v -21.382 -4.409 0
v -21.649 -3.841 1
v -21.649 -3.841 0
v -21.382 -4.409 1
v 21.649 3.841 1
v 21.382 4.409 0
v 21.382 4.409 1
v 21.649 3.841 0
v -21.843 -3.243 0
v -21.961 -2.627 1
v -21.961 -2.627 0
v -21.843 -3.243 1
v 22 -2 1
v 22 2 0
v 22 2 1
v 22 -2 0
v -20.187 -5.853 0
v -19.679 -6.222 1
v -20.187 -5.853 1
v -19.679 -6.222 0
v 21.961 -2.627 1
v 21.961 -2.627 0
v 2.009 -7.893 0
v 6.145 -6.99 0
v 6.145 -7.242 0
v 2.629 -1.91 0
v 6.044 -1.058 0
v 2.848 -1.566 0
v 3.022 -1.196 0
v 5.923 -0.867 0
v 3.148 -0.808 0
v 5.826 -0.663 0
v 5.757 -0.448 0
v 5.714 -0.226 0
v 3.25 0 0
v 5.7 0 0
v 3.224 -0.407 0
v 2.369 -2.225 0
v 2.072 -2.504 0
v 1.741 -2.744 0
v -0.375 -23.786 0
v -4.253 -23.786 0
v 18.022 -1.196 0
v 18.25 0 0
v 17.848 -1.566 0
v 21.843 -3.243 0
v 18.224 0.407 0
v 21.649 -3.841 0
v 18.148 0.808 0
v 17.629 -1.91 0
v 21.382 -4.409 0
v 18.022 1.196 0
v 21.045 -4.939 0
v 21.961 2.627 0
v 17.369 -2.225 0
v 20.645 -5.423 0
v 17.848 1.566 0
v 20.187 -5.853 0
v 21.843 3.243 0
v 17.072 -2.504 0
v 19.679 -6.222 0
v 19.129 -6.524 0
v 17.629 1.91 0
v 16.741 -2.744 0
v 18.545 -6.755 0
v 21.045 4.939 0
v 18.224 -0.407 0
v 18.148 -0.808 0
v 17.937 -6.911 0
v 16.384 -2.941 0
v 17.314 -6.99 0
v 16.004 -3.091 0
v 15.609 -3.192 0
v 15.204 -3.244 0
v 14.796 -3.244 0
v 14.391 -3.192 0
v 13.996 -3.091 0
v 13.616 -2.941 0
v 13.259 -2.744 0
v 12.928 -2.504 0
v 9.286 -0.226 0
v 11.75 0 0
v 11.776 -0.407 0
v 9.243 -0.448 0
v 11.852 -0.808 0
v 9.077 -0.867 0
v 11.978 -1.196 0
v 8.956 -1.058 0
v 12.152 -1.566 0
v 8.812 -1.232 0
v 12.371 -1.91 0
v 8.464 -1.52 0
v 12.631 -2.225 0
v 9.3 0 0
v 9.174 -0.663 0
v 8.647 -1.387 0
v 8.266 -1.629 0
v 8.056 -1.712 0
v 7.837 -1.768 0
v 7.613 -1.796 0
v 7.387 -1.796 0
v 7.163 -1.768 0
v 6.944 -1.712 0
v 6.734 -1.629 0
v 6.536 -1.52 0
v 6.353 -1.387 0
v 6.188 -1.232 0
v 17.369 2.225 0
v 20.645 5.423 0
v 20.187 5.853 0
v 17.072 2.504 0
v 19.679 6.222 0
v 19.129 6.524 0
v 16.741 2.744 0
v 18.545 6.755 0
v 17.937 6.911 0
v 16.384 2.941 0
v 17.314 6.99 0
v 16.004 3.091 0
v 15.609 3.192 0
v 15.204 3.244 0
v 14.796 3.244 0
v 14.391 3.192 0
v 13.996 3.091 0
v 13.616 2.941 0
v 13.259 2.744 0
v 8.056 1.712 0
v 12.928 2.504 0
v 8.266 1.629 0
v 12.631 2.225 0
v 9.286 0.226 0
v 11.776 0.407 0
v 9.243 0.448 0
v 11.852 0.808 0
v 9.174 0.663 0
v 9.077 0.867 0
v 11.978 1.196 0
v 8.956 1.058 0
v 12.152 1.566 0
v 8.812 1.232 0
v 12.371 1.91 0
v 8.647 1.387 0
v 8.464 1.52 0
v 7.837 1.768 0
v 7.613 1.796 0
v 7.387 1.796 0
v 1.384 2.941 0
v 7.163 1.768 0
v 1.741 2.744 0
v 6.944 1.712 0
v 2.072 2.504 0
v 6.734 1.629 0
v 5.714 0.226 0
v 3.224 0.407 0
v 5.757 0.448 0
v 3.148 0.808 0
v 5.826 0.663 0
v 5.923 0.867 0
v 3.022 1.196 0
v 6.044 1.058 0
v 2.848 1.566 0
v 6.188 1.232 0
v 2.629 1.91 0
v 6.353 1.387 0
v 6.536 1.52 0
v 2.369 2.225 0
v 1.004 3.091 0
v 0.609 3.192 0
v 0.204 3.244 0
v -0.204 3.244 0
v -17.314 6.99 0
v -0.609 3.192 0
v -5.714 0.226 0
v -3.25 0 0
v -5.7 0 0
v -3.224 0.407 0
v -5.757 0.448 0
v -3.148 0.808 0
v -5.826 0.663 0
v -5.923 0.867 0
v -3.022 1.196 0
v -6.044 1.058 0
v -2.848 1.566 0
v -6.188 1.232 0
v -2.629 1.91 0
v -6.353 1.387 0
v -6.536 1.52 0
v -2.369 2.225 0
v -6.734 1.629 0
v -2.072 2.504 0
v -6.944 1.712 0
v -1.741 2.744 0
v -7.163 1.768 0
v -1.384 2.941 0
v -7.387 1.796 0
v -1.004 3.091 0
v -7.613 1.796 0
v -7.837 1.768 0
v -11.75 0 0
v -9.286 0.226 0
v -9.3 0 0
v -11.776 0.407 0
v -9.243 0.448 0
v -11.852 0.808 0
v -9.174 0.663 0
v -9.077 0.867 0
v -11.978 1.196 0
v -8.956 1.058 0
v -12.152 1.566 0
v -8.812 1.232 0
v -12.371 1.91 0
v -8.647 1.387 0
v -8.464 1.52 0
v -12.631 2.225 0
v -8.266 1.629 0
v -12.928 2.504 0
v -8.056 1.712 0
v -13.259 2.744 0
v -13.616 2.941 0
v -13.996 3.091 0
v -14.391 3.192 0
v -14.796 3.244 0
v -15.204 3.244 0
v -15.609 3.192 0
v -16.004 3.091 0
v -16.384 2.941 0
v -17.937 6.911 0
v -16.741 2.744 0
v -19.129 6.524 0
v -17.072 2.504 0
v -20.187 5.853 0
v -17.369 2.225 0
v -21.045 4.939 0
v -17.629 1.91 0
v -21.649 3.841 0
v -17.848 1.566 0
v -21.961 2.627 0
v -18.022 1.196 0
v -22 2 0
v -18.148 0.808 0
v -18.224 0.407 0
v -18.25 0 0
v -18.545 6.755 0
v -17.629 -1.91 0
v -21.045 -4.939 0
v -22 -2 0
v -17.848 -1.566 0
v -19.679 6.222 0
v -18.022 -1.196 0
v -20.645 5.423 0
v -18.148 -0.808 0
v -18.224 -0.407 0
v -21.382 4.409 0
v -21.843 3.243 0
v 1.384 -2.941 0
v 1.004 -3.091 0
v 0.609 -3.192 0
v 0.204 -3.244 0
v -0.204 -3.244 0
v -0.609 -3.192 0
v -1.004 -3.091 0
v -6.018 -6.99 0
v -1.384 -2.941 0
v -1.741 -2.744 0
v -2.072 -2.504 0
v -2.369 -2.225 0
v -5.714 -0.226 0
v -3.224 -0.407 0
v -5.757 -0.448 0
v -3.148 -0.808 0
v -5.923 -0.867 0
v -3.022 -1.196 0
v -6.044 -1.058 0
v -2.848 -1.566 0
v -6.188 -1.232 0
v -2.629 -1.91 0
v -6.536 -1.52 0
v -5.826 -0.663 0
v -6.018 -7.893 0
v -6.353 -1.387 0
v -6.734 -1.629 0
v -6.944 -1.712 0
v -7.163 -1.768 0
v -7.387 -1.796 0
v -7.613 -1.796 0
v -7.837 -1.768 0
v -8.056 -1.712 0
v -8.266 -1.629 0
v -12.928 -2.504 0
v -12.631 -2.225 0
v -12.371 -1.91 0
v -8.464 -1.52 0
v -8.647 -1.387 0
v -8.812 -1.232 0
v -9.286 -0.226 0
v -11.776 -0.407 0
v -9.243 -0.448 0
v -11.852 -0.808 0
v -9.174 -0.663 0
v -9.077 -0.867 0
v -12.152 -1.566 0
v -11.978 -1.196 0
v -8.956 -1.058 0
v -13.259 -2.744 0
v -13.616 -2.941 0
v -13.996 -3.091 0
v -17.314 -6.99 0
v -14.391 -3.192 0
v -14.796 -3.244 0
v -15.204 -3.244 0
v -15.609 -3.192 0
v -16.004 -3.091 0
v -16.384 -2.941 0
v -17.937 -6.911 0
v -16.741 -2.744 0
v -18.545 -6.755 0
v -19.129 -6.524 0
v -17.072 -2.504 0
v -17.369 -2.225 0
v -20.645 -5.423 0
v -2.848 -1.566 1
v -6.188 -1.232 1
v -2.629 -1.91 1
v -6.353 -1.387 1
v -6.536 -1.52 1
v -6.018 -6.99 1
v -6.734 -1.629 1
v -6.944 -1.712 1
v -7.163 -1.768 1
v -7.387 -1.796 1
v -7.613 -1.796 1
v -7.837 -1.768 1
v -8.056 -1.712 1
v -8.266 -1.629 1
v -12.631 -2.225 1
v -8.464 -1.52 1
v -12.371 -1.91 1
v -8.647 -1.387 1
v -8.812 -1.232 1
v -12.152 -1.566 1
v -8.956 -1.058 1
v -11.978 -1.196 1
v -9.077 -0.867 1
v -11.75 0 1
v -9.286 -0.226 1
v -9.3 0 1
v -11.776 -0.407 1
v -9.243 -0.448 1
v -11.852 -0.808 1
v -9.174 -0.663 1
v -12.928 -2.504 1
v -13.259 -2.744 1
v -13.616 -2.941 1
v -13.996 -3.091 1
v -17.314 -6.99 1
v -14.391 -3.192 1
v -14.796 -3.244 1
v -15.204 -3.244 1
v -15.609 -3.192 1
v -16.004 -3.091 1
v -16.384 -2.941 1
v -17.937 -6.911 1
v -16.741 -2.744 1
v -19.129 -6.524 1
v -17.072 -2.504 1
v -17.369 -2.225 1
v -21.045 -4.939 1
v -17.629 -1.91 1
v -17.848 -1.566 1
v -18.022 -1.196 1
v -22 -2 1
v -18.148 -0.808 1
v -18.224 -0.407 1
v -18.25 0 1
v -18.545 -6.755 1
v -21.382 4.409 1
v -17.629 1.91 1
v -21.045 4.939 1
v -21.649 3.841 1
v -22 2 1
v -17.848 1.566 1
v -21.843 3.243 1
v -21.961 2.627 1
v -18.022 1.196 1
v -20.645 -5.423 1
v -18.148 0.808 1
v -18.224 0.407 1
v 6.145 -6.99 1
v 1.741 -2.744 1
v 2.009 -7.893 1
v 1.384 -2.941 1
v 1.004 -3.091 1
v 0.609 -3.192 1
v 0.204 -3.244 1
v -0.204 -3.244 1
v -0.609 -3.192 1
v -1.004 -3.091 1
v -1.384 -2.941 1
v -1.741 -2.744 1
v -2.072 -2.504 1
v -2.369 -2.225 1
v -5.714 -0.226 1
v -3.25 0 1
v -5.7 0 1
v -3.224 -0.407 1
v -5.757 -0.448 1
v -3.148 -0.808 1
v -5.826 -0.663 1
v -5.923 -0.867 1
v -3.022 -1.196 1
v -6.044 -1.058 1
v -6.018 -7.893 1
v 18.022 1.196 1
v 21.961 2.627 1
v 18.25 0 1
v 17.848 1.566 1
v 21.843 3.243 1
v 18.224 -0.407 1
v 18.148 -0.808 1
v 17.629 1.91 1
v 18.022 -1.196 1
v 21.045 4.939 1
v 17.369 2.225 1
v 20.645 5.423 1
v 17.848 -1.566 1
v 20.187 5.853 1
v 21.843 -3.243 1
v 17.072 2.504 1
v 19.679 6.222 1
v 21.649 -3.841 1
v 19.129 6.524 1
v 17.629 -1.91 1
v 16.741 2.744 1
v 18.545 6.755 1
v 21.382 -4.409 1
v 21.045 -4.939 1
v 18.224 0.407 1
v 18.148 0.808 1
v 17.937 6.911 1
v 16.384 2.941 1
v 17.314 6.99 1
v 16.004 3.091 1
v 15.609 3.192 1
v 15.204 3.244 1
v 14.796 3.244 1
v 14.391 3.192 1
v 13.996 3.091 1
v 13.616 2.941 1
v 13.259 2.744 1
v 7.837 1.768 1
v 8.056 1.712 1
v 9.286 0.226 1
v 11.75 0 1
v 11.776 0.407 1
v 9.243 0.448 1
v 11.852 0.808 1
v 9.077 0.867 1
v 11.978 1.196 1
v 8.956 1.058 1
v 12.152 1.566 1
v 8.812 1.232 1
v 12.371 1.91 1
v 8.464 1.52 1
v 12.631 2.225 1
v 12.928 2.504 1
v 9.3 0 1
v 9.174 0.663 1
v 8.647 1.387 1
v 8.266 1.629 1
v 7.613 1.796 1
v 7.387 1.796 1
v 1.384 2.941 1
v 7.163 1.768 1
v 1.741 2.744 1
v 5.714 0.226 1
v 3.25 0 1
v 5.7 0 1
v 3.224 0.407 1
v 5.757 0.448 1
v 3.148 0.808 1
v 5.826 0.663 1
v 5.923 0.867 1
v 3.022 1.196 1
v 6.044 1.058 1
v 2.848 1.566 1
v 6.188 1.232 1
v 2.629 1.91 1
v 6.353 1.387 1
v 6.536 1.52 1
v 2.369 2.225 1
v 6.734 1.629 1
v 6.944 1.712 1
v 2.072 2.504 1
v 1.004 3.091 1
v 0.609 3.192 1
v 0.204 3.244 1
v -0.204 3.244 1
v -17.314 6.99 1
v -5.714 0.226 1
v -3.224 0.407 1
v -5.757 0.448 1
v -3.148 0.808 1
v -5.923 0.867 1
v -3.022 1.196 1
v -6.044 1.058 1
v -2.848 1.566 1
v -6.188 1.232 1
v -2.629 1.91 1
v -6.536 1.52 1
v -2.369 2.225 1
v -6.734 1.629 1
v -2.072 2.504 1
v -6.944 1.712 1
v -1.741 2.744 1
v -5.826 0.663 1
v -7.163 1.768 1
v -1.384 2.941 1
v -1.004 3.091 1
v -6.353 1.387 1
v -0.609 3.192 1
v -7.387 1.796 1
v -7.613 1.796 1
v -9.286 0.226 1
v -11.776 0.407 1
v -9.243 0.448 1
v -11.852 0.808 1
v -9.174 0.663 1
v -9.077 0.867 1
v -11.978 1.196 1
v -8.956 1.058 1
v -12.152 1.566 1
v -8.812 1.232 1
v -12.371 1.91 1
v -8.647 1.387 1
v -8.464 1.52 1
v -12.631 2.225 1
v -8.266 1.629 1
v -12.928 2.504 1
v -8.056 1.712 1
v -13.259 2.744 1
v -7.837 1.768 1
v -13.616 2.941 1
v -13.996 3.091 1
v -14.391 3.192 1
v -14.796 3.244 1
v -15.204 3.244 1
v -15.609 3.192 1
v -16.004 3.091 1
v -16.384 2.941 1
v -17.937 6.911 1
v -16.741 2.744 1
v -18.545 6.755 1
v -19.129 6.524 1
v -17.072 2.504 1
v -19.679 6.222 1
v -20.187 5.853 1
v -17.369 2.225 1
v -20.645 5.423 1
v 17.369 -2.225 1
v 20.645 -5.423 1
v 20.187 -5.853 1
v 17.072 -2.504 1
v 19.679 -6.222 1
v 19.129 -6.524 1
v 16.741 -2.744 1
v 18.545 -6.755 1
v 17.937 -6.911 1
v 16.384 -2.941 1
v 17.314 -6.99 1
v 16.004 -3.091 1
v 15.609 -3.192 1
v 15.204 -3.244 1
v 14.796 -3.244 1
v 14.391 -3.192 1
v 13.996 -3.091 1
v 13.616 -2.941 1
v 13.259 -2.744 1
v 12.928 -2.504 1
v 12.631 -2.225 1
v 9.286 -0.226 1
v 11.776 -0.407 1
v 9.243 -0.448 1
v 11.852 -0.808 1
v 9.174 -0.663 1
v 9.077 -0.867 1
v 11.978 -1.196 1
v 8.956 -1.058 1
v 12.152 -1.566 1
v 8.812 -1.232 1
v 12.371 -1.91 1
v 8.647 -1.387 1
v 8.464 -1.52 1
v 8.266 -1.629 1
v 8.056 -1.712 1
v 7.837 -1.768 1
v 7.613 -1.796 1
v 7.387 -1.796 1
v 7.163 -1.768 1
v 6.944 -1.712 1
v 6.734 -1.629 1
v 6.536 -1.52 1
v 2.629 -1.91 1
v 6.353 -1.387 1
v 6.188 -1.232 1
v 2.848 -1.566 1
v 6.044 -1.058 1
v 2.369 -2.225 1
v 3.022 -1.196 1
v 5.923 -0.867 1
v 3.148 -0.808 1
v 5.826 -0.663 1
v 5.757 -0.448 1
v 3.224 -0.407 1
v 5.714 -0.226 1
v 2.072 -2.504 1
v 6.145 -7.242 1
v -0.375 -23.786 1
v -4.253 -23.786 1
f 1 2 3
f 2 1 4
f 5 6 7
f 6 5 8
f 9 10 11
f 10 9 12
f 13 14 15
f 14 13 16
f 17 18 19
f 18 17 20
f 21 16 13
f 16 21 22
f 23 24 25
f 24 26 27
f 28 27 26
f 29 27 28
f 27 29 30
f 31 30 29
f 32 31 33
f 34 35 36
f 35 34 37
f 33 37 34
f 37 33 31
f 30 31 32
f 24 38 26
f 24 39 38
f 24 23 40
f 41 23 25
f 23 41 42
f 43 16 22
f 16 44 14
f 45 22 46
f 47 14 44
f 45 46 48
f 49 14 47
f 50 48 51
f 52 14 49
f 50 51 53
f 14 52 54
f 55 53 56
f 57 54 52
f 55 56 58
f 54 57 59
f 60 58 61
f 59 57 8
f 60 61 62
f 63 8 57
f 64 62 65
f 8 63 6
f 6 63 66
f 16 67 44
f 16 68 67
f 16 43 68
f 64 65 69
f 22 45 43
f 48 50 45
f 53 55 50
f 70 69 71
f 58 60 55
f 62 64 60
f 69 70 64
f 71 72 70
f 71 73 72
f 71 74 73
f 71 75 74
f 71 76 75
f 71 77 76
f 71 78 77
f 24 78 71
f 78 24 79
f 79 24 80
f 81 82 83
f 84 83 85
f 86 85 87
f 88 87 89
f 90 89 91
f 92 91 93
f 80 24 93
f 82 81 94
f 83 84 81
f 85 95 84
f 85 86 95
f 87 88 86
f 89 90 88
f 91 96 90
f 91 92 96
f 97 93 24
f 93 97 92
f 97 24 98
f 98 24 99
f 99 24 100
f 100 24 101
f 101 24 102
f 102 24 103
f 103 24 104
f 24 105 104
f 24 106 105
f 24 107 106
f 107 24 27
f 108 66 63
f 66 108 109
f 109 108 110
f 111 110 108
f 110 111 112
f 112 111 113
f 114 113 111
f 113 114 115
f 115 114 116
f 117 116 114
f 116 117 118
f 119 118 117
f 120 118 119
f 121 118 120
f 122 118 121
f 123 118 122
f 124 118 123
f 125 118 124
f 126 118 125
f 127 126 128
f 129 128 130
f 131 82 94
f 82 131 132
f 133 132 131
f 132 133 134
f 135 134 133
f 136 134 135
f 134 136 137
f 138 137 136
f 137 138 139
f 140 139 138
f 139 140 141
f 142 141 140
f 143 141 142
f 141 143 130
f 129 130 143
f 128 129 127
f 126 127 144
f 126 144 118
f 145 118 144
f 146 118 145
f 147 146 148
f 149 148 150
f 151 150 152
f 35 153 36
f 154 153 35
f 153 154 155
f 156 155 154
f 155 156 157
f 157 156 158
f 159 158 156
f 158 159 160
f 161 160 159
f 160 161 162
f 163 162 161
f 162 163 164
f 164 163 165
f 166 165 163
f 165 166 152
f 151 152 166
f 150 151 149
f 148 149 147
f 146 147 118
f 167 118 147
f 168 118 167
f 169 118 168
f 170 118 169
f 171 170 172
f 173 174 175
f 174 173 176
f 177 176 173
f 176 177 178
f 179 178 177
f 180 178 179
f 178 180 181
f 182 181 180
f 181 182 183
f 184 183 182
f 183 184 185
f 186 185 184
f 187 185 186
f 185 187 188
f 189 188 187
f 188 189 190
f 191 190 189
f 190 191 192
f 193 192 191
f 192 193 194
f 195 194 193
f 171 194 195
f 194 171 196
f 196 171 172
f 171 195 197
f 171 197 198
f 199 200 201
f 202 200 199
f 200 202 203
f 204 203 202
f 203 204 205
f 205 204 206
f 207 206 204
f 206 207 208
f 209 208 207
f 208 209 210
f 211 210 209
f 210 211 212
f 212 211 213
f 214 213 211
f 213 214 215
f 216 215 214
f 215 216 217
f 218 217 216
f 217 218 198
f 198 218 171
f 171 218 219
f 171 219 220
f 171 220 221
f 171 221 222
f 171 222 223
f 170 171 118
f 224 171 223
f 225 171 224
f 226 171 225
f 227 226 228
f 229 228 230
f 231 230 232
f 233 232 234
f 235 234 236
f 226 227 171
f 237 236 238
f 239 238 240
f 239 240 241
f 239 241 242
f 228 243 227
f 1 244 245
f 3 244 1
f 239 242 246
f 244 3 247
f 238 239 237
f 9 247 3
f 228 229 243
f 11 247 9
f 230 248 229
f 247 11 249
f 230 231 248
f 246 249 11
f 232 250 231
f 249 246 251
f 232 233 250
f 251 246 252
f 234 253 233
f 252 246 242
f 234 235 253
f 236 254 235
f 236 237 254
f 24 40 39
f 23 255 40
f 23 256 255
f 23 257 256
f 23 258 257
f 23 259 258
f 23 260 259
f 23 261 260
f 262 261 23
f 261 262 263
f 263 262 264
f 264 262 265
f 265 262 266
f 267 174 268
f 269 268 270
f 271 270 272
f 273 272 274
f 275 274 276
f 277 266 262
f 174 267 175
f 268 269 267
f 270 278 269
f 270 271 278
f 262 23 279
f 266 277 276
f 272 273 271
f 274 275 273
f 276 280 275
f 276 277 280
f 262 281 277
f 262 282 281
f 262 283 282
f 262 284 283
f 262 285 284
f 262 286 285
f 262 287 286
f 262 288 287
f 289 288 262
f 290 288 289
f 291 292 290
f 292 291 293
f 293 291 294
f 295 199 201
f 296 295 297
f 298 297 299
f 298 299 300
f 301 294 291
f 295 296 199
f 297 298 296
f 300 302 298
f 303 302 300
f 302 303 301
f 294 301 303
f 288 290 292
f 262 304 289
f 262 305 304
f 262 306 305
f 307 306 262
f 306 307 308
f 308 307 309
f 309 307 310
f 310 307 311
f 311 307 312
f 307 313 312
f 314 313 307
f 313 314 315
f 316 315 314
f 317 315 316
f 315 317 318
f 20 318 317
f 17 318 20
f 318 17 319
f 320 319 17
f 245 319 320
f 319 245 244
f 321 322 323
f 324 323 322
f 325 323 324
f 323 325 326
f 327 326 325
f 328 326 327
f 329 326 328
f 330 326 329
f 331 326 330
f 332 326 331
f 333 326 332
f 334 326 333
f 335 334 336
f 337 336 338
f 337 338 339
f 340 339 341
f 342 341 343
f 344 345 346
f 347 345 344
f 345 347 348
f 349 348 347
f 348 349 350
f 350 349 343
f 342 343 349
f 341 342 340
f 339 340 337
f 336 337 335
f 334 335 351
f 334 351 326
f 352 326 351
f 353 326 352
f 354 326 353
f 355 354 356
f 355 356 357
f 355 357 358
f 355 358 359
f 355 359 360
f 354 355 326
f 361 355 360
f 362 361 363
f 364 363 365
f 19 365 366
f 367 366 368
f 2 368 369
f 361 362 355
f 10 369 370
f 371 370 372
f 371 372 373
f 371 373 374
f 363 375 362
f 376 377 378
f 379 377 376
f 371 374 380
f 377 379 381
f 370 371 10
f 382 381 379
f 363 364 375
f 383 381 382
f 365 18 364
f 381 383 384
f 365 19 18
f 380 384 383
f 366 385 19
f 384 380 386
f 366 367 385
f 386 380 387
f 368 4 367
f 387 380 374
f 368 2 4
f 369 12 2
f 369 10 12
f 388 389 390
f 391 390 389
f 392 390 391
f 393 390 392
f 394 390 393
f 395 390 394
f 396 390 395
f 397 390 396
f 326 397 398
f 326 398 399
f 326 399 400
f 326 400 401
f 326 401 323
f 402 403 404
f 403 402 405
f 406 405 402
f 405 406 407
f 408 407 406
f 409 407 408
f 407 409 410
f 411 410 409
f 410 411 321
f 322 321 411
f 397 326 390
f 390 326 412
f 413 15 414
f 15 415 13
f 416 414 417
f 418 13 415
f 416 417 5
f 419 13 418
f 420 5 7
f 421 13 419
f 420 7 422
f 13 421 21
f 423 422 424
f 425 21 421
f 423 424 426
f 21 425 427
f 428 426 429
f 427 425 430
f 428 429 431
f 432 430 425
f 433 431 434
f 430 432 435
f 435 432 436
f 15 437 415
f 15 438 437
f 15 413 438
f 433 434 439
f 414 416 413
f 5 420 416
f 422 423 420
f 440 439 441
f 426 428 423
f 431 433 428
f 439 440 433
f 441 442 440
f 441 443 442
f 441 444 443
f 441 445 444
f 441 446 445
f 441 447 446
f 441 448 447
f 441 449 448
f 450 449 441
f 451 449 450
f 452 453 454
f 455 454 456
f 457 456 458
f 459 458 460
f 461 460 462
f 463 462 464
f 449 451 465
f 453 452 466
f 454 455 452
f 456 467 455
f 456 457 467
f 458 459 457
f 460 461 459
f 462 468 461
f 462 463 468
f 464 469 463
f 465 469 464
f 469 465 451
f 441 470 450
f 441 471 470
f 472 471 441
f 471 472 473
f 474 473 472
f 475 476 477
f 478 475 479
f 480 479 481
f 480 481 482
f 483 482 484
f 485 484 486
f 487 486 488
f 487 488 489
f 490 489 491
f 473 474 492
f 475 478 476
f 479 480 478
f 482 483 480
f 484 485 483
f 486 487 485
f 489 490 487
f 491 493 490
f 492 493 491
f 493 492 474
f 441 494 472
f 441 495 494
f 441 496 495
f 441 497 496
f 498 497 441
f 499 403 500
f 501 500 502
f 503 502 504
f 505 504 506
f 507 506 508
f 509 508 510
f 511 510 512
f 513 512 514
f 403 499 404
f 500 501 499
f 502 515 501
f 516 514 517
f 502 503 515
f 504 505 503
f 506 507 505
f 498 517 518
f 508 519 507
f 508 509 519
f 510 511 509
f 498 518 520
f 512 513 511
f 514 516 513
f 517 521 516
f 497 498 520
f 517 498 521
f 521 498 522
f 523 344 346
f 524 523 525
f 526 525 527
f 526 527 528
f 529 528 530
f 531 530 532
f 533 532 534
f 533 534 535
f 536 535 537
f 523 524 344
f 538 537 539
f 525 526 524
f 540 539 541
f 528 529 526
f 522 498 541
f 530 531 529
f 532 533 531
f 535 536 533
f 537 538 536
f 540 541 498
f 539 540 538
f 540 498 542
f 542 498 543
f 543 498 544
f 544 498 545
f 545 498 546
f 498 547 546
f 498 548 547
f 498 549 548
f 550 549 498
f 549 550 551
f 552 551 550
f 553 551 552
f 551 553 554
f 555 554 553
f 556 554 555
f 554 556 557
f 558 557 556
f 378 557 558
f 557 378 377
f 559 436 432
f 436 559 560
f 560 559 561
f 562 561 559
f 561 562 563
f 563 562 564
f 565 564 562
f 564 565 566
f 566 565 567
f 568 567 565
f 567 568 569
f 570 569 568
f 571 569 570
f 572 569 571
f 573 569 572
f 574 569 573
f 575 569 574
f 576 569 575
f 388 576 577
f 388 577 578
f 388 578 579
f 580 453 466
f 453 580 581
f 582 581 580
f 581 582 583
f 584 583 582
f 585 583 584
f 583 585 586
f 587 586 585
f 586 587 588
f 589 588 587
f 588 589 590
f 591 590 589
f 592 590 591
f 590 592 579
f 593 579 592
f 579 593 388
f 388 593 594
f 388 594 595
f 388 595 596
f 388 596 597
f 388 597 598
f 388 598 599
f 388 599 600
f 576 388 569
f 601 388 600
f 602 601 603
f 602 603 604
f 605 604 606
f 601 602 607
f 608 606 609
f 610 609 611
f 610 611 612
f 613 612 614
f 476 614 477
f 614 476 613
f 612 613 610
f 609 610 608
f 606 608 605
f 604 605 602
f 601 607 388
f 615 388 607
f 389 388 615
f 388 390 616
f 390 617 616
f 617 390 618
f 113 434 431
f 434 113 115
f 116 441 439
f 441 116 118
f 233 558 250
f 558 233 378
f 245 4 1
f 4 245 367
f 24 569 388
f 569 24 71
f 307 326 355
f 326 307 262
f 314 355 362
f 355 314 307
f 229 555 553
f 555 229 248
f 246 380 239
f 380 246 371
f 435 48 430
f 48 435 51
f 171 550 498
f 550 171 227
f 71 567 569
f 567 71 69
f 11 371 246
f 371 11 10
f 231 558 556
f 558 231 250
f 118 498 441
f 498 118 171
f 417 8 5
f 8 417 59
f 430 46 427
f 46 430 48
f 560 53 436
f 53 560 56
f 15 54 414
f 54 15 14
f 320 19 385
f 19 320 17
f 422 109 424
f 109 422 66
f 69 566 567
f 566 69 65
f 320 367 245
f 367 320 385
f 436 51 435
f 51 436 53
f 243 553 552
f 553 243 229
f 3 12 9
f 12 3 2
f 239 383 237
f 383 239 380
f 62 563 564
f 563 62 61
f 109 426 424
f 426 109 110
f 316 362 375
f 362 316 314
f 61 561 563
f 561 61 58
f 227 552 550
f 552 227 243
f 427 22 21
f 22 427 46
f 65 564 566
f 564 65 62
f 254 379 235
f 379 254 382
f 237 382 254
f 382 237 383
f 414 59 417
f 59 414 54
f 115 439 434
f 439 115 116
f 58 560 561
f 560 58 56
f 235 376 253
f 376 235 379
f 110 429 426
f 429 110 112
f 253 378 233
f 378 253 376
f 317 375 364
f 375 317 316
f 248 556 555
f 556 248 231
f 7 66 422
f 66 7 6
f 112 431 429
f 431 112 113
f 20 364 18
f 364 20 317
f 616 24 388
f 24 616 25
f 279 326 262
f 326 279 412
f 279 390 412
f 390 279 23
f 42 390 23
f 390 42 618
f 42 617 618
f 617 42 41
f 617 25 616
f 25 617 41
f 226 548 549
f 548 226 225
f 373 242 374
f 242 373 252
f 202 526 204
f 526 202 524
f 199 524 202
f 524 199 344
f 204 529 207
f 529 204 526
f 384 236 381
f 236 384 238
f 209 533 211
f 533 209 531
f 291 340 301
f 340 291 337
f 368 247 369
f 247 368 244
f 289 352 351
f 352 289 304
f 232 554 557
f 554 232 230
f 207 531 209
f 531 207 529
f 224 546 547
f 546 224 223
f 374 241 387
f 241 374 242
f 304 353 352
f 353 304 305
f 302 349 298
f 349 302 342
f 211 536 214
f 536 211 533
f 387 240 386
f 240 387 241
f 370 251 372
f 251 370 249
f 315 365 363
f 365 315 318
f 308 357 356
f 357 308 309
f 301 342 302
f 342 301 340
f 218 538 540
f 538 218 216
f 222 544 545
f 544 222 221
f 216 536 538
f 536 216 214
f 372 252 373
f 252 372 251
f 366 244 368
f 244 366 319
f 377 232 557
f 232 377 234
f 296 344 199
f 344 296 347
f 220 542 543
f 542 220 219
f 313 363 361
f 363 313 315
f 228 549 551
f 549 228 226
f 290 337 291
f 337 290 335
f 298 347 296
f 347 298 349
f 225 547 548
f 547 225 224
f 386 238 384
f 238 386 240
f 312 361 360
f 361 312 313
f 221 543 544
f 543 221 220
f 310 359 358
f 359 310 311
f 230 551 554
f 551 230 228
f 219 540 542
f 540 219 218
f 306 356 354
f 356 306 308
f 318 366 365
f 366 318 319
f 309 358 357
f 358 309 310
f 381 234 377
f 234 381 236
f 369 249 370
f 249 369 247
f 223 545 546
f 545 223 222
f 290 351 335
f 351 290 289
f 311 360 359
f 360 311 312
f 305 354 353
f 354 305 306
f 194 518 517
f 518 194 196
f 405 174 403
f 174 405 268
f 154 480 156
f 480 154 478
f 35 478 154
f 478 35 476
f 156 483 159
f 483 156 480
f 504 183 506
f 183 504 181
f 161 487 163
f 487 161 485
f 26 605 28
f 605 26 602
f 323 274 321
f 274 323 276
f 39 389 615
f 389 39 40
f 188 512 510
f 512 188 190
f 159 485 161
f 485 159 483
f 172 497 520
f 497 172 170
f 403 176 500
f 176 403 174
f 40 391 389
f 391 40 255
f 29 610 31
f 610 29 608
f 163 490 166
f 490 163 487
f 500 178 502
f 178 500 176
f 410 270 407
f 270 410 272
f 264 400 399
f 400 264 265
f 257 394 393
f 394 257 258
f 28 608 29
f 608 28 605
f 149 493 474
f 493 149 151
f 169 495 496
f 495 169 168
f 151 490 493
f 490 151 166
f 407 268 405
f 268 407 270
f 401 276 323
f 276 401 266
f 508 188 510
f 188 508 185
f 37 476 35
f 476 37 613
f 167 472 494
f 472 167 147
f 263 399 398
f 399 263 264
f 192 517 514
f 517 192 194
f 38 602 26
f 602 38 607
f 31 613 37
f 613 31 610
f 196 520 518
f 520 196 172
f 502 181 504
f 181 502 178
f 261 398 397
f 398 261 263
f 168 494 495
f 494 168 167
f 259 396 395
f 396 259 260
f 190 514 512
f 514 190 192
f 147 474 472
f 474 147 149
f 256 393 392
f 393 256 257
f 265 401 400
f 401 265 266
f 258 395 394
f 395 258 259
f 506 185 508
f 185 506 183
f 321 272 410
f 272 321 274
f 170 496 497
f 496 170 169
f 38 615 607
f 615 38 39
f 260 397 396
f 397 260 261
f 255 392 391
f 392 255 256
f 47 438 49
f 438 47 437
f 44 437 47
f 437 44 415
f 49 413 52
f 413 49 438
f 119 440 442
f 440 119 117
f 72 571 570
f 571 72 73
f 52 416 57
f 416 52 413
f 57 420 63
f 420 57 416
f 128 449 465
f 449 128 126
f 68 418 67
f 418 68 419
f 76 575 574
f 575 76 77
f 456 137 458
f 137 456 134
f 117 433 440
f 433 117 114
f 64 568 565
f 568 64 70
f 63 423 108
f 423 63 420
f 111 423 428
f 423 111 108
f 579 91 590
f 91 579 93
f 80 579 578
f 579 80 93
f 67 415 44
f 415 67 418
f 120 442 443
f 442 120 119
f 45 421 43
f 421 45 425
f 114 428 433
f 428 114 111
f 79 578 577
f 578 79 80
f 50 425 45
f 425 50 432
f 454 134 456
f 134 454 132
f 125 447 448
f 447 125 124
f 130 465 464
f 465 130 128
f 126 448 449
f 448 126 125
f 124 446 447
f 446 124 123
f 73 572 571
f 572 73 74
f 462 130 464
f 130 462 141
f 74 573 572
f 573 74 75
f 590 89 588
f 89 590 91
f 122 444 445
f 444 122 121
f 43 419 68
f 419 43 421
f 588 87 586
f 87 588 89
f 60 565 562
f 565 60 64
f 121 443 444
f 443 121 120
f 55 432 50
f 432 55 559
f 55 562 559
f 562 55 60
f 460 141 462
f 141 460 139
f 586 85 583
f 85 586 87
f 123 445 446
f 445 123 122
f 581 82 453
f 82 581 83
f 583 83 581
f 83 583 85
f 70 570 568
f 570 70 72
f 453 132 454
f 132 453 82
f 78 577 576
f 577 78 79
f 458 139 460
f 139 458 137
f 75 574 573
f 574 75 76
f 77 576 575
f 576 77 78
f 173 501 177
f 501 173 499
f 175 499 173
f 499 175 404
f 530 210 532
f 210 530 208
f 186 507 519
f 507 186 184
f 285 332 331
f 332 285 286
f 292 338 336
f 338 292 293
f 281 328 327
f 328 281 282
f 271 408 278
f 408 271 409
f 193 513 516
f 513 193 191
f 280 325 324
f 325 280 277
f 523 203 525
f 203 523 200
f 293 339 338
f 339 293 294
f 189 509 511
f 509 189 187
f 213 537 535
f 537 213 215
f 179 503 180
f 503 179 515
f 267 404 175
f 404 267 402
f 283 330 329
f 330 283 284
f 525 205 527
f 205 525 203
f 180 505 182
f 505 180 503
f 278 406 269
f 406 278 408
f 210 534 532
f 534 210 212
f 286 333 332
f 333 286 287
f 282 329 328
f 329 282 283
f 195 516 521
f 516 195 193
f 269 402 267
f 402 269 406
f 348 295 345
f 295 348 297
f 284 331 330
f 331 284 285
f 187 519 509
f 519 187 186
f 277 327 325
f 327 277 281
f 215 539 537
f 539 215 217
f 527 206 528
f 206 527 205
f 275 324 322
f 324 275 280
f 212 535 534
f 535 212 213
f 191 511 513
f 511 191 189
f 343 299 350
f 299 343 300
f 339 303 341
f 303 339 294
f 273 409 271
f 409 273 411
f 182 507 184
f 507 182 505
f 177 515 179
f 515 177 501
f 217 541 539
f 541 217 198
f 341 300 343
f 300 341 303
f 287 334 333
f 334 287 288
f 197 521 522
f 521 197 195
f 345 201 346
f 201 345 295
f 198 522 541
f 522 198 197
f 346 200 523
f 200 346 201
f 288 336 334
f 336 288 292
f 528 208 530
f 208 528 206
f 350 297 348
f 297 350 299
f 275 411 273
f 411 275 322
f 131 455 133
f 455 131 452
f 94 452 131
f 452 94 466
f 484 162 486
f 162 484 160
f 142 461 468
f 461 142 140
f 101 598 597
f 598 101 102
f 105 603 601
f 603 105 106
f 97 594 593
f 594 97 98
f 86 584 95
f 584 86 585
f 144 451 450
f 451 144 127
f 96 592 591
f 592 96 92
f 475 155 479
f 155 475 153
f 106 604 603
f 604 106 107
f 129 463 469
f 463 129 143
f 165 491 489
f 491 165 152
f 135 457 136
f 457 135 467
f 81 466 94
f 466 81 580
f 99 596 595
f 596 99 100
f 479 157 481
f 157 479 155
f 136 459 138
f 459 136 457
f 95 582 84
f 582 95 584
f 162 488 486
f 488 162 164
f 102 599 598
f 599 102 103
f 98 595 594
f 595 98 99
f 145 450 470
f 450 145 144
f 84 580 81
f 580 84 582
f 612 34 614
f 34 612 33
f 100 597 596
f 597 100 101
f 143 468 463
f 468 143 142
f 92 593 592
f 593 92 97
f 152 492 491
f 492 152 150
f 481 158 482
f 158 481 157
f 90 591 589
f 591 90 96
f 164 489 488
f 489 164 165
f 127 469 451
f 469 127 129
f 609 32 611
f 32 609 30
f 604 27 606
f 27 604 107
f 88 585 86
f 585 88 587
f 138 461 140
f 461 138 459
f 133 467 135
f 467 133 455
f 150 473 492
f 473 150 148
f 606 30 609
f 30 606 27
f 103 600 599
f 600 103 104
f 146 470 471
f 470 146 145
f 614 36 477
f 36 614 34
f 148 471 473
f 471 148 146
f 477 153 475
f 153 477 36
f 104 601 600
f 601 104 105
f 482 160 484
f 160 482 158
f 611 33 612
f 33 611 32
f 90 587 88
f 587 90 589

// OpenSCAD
$fn = 50;


difference() {
	union() {
		hull() {
			translate(v = [-17.0000000000, 2.0000000000, 0]) {
				cylinder(h = 1, r = 5);
			}
			translate(v = [17.0000000000, 2.0000000000, 0]) {
				cylinder(h = 1, r = 5);
			}
			translate(v = [-17.0000000000, -2.0000000000, 0]) {
				cylinder(h = 1, r = 5);
			}
			translate(v = [17.0000000000, -2.0000000000, 0]) {
				cylinder(h = 1, r = 5);
			}
		}
		translate(v = [0, -5, 0]) {
			linear_extrude(height = 1) {
				text(font = "DejaVu Sans Mono:style=Bold", halign = "center", size = 19.0000000000, text = "7", valign = "top");
			}
		}
	}
	union() {
		translate(v = [-15.0000000000, 0.0000000000, 0]) {
			translate(v = [0, 0, -100]) {
				cylinder(h = 200, r = 3.2500000000);
			}
		}
		translate(v = [0, 0, -100]) {
			cylinder(h = 200, r = 3.2500000000);
		}
		translate(v = [15.0000000000, 0.0000000000, 0]) {
			translate(v = [0, 0, -100]) {
				cylinder(h = 200, r = 3.2500000000);
			}
		}
		translate(v = [-15.0000000000, 0.0000000000, 0]) {
			translate(v = [0, 0, -100]) {
				cylinder(h = 200, r = 1.8000000000);
			}
		}
		translate(v = [-7.5000000000, 0.0000000000, 0]) {
			translate(v = [0, 0, -100]) {
				cylinder(h = 200, r = 1.8000000000);
			}
		}
		translate(v = [0, 0, -100]) {
			cylinder(h = 200, r = 1.8000000000);
		}
		translate(v = [7.5000000000, 0.0000000000, 0]) {
			translate(v = [0, 0, -100]) {
				cylinder(h = 200, r = 1.8000000000);
			}
		}
		translate(v = [15.0000000000, 0.0000000000, 0]) {
			translate(v = [0, 0, -100]) {
				cylinder(h = 200, r = 1.8000000000);
			}
		}
	}
}
